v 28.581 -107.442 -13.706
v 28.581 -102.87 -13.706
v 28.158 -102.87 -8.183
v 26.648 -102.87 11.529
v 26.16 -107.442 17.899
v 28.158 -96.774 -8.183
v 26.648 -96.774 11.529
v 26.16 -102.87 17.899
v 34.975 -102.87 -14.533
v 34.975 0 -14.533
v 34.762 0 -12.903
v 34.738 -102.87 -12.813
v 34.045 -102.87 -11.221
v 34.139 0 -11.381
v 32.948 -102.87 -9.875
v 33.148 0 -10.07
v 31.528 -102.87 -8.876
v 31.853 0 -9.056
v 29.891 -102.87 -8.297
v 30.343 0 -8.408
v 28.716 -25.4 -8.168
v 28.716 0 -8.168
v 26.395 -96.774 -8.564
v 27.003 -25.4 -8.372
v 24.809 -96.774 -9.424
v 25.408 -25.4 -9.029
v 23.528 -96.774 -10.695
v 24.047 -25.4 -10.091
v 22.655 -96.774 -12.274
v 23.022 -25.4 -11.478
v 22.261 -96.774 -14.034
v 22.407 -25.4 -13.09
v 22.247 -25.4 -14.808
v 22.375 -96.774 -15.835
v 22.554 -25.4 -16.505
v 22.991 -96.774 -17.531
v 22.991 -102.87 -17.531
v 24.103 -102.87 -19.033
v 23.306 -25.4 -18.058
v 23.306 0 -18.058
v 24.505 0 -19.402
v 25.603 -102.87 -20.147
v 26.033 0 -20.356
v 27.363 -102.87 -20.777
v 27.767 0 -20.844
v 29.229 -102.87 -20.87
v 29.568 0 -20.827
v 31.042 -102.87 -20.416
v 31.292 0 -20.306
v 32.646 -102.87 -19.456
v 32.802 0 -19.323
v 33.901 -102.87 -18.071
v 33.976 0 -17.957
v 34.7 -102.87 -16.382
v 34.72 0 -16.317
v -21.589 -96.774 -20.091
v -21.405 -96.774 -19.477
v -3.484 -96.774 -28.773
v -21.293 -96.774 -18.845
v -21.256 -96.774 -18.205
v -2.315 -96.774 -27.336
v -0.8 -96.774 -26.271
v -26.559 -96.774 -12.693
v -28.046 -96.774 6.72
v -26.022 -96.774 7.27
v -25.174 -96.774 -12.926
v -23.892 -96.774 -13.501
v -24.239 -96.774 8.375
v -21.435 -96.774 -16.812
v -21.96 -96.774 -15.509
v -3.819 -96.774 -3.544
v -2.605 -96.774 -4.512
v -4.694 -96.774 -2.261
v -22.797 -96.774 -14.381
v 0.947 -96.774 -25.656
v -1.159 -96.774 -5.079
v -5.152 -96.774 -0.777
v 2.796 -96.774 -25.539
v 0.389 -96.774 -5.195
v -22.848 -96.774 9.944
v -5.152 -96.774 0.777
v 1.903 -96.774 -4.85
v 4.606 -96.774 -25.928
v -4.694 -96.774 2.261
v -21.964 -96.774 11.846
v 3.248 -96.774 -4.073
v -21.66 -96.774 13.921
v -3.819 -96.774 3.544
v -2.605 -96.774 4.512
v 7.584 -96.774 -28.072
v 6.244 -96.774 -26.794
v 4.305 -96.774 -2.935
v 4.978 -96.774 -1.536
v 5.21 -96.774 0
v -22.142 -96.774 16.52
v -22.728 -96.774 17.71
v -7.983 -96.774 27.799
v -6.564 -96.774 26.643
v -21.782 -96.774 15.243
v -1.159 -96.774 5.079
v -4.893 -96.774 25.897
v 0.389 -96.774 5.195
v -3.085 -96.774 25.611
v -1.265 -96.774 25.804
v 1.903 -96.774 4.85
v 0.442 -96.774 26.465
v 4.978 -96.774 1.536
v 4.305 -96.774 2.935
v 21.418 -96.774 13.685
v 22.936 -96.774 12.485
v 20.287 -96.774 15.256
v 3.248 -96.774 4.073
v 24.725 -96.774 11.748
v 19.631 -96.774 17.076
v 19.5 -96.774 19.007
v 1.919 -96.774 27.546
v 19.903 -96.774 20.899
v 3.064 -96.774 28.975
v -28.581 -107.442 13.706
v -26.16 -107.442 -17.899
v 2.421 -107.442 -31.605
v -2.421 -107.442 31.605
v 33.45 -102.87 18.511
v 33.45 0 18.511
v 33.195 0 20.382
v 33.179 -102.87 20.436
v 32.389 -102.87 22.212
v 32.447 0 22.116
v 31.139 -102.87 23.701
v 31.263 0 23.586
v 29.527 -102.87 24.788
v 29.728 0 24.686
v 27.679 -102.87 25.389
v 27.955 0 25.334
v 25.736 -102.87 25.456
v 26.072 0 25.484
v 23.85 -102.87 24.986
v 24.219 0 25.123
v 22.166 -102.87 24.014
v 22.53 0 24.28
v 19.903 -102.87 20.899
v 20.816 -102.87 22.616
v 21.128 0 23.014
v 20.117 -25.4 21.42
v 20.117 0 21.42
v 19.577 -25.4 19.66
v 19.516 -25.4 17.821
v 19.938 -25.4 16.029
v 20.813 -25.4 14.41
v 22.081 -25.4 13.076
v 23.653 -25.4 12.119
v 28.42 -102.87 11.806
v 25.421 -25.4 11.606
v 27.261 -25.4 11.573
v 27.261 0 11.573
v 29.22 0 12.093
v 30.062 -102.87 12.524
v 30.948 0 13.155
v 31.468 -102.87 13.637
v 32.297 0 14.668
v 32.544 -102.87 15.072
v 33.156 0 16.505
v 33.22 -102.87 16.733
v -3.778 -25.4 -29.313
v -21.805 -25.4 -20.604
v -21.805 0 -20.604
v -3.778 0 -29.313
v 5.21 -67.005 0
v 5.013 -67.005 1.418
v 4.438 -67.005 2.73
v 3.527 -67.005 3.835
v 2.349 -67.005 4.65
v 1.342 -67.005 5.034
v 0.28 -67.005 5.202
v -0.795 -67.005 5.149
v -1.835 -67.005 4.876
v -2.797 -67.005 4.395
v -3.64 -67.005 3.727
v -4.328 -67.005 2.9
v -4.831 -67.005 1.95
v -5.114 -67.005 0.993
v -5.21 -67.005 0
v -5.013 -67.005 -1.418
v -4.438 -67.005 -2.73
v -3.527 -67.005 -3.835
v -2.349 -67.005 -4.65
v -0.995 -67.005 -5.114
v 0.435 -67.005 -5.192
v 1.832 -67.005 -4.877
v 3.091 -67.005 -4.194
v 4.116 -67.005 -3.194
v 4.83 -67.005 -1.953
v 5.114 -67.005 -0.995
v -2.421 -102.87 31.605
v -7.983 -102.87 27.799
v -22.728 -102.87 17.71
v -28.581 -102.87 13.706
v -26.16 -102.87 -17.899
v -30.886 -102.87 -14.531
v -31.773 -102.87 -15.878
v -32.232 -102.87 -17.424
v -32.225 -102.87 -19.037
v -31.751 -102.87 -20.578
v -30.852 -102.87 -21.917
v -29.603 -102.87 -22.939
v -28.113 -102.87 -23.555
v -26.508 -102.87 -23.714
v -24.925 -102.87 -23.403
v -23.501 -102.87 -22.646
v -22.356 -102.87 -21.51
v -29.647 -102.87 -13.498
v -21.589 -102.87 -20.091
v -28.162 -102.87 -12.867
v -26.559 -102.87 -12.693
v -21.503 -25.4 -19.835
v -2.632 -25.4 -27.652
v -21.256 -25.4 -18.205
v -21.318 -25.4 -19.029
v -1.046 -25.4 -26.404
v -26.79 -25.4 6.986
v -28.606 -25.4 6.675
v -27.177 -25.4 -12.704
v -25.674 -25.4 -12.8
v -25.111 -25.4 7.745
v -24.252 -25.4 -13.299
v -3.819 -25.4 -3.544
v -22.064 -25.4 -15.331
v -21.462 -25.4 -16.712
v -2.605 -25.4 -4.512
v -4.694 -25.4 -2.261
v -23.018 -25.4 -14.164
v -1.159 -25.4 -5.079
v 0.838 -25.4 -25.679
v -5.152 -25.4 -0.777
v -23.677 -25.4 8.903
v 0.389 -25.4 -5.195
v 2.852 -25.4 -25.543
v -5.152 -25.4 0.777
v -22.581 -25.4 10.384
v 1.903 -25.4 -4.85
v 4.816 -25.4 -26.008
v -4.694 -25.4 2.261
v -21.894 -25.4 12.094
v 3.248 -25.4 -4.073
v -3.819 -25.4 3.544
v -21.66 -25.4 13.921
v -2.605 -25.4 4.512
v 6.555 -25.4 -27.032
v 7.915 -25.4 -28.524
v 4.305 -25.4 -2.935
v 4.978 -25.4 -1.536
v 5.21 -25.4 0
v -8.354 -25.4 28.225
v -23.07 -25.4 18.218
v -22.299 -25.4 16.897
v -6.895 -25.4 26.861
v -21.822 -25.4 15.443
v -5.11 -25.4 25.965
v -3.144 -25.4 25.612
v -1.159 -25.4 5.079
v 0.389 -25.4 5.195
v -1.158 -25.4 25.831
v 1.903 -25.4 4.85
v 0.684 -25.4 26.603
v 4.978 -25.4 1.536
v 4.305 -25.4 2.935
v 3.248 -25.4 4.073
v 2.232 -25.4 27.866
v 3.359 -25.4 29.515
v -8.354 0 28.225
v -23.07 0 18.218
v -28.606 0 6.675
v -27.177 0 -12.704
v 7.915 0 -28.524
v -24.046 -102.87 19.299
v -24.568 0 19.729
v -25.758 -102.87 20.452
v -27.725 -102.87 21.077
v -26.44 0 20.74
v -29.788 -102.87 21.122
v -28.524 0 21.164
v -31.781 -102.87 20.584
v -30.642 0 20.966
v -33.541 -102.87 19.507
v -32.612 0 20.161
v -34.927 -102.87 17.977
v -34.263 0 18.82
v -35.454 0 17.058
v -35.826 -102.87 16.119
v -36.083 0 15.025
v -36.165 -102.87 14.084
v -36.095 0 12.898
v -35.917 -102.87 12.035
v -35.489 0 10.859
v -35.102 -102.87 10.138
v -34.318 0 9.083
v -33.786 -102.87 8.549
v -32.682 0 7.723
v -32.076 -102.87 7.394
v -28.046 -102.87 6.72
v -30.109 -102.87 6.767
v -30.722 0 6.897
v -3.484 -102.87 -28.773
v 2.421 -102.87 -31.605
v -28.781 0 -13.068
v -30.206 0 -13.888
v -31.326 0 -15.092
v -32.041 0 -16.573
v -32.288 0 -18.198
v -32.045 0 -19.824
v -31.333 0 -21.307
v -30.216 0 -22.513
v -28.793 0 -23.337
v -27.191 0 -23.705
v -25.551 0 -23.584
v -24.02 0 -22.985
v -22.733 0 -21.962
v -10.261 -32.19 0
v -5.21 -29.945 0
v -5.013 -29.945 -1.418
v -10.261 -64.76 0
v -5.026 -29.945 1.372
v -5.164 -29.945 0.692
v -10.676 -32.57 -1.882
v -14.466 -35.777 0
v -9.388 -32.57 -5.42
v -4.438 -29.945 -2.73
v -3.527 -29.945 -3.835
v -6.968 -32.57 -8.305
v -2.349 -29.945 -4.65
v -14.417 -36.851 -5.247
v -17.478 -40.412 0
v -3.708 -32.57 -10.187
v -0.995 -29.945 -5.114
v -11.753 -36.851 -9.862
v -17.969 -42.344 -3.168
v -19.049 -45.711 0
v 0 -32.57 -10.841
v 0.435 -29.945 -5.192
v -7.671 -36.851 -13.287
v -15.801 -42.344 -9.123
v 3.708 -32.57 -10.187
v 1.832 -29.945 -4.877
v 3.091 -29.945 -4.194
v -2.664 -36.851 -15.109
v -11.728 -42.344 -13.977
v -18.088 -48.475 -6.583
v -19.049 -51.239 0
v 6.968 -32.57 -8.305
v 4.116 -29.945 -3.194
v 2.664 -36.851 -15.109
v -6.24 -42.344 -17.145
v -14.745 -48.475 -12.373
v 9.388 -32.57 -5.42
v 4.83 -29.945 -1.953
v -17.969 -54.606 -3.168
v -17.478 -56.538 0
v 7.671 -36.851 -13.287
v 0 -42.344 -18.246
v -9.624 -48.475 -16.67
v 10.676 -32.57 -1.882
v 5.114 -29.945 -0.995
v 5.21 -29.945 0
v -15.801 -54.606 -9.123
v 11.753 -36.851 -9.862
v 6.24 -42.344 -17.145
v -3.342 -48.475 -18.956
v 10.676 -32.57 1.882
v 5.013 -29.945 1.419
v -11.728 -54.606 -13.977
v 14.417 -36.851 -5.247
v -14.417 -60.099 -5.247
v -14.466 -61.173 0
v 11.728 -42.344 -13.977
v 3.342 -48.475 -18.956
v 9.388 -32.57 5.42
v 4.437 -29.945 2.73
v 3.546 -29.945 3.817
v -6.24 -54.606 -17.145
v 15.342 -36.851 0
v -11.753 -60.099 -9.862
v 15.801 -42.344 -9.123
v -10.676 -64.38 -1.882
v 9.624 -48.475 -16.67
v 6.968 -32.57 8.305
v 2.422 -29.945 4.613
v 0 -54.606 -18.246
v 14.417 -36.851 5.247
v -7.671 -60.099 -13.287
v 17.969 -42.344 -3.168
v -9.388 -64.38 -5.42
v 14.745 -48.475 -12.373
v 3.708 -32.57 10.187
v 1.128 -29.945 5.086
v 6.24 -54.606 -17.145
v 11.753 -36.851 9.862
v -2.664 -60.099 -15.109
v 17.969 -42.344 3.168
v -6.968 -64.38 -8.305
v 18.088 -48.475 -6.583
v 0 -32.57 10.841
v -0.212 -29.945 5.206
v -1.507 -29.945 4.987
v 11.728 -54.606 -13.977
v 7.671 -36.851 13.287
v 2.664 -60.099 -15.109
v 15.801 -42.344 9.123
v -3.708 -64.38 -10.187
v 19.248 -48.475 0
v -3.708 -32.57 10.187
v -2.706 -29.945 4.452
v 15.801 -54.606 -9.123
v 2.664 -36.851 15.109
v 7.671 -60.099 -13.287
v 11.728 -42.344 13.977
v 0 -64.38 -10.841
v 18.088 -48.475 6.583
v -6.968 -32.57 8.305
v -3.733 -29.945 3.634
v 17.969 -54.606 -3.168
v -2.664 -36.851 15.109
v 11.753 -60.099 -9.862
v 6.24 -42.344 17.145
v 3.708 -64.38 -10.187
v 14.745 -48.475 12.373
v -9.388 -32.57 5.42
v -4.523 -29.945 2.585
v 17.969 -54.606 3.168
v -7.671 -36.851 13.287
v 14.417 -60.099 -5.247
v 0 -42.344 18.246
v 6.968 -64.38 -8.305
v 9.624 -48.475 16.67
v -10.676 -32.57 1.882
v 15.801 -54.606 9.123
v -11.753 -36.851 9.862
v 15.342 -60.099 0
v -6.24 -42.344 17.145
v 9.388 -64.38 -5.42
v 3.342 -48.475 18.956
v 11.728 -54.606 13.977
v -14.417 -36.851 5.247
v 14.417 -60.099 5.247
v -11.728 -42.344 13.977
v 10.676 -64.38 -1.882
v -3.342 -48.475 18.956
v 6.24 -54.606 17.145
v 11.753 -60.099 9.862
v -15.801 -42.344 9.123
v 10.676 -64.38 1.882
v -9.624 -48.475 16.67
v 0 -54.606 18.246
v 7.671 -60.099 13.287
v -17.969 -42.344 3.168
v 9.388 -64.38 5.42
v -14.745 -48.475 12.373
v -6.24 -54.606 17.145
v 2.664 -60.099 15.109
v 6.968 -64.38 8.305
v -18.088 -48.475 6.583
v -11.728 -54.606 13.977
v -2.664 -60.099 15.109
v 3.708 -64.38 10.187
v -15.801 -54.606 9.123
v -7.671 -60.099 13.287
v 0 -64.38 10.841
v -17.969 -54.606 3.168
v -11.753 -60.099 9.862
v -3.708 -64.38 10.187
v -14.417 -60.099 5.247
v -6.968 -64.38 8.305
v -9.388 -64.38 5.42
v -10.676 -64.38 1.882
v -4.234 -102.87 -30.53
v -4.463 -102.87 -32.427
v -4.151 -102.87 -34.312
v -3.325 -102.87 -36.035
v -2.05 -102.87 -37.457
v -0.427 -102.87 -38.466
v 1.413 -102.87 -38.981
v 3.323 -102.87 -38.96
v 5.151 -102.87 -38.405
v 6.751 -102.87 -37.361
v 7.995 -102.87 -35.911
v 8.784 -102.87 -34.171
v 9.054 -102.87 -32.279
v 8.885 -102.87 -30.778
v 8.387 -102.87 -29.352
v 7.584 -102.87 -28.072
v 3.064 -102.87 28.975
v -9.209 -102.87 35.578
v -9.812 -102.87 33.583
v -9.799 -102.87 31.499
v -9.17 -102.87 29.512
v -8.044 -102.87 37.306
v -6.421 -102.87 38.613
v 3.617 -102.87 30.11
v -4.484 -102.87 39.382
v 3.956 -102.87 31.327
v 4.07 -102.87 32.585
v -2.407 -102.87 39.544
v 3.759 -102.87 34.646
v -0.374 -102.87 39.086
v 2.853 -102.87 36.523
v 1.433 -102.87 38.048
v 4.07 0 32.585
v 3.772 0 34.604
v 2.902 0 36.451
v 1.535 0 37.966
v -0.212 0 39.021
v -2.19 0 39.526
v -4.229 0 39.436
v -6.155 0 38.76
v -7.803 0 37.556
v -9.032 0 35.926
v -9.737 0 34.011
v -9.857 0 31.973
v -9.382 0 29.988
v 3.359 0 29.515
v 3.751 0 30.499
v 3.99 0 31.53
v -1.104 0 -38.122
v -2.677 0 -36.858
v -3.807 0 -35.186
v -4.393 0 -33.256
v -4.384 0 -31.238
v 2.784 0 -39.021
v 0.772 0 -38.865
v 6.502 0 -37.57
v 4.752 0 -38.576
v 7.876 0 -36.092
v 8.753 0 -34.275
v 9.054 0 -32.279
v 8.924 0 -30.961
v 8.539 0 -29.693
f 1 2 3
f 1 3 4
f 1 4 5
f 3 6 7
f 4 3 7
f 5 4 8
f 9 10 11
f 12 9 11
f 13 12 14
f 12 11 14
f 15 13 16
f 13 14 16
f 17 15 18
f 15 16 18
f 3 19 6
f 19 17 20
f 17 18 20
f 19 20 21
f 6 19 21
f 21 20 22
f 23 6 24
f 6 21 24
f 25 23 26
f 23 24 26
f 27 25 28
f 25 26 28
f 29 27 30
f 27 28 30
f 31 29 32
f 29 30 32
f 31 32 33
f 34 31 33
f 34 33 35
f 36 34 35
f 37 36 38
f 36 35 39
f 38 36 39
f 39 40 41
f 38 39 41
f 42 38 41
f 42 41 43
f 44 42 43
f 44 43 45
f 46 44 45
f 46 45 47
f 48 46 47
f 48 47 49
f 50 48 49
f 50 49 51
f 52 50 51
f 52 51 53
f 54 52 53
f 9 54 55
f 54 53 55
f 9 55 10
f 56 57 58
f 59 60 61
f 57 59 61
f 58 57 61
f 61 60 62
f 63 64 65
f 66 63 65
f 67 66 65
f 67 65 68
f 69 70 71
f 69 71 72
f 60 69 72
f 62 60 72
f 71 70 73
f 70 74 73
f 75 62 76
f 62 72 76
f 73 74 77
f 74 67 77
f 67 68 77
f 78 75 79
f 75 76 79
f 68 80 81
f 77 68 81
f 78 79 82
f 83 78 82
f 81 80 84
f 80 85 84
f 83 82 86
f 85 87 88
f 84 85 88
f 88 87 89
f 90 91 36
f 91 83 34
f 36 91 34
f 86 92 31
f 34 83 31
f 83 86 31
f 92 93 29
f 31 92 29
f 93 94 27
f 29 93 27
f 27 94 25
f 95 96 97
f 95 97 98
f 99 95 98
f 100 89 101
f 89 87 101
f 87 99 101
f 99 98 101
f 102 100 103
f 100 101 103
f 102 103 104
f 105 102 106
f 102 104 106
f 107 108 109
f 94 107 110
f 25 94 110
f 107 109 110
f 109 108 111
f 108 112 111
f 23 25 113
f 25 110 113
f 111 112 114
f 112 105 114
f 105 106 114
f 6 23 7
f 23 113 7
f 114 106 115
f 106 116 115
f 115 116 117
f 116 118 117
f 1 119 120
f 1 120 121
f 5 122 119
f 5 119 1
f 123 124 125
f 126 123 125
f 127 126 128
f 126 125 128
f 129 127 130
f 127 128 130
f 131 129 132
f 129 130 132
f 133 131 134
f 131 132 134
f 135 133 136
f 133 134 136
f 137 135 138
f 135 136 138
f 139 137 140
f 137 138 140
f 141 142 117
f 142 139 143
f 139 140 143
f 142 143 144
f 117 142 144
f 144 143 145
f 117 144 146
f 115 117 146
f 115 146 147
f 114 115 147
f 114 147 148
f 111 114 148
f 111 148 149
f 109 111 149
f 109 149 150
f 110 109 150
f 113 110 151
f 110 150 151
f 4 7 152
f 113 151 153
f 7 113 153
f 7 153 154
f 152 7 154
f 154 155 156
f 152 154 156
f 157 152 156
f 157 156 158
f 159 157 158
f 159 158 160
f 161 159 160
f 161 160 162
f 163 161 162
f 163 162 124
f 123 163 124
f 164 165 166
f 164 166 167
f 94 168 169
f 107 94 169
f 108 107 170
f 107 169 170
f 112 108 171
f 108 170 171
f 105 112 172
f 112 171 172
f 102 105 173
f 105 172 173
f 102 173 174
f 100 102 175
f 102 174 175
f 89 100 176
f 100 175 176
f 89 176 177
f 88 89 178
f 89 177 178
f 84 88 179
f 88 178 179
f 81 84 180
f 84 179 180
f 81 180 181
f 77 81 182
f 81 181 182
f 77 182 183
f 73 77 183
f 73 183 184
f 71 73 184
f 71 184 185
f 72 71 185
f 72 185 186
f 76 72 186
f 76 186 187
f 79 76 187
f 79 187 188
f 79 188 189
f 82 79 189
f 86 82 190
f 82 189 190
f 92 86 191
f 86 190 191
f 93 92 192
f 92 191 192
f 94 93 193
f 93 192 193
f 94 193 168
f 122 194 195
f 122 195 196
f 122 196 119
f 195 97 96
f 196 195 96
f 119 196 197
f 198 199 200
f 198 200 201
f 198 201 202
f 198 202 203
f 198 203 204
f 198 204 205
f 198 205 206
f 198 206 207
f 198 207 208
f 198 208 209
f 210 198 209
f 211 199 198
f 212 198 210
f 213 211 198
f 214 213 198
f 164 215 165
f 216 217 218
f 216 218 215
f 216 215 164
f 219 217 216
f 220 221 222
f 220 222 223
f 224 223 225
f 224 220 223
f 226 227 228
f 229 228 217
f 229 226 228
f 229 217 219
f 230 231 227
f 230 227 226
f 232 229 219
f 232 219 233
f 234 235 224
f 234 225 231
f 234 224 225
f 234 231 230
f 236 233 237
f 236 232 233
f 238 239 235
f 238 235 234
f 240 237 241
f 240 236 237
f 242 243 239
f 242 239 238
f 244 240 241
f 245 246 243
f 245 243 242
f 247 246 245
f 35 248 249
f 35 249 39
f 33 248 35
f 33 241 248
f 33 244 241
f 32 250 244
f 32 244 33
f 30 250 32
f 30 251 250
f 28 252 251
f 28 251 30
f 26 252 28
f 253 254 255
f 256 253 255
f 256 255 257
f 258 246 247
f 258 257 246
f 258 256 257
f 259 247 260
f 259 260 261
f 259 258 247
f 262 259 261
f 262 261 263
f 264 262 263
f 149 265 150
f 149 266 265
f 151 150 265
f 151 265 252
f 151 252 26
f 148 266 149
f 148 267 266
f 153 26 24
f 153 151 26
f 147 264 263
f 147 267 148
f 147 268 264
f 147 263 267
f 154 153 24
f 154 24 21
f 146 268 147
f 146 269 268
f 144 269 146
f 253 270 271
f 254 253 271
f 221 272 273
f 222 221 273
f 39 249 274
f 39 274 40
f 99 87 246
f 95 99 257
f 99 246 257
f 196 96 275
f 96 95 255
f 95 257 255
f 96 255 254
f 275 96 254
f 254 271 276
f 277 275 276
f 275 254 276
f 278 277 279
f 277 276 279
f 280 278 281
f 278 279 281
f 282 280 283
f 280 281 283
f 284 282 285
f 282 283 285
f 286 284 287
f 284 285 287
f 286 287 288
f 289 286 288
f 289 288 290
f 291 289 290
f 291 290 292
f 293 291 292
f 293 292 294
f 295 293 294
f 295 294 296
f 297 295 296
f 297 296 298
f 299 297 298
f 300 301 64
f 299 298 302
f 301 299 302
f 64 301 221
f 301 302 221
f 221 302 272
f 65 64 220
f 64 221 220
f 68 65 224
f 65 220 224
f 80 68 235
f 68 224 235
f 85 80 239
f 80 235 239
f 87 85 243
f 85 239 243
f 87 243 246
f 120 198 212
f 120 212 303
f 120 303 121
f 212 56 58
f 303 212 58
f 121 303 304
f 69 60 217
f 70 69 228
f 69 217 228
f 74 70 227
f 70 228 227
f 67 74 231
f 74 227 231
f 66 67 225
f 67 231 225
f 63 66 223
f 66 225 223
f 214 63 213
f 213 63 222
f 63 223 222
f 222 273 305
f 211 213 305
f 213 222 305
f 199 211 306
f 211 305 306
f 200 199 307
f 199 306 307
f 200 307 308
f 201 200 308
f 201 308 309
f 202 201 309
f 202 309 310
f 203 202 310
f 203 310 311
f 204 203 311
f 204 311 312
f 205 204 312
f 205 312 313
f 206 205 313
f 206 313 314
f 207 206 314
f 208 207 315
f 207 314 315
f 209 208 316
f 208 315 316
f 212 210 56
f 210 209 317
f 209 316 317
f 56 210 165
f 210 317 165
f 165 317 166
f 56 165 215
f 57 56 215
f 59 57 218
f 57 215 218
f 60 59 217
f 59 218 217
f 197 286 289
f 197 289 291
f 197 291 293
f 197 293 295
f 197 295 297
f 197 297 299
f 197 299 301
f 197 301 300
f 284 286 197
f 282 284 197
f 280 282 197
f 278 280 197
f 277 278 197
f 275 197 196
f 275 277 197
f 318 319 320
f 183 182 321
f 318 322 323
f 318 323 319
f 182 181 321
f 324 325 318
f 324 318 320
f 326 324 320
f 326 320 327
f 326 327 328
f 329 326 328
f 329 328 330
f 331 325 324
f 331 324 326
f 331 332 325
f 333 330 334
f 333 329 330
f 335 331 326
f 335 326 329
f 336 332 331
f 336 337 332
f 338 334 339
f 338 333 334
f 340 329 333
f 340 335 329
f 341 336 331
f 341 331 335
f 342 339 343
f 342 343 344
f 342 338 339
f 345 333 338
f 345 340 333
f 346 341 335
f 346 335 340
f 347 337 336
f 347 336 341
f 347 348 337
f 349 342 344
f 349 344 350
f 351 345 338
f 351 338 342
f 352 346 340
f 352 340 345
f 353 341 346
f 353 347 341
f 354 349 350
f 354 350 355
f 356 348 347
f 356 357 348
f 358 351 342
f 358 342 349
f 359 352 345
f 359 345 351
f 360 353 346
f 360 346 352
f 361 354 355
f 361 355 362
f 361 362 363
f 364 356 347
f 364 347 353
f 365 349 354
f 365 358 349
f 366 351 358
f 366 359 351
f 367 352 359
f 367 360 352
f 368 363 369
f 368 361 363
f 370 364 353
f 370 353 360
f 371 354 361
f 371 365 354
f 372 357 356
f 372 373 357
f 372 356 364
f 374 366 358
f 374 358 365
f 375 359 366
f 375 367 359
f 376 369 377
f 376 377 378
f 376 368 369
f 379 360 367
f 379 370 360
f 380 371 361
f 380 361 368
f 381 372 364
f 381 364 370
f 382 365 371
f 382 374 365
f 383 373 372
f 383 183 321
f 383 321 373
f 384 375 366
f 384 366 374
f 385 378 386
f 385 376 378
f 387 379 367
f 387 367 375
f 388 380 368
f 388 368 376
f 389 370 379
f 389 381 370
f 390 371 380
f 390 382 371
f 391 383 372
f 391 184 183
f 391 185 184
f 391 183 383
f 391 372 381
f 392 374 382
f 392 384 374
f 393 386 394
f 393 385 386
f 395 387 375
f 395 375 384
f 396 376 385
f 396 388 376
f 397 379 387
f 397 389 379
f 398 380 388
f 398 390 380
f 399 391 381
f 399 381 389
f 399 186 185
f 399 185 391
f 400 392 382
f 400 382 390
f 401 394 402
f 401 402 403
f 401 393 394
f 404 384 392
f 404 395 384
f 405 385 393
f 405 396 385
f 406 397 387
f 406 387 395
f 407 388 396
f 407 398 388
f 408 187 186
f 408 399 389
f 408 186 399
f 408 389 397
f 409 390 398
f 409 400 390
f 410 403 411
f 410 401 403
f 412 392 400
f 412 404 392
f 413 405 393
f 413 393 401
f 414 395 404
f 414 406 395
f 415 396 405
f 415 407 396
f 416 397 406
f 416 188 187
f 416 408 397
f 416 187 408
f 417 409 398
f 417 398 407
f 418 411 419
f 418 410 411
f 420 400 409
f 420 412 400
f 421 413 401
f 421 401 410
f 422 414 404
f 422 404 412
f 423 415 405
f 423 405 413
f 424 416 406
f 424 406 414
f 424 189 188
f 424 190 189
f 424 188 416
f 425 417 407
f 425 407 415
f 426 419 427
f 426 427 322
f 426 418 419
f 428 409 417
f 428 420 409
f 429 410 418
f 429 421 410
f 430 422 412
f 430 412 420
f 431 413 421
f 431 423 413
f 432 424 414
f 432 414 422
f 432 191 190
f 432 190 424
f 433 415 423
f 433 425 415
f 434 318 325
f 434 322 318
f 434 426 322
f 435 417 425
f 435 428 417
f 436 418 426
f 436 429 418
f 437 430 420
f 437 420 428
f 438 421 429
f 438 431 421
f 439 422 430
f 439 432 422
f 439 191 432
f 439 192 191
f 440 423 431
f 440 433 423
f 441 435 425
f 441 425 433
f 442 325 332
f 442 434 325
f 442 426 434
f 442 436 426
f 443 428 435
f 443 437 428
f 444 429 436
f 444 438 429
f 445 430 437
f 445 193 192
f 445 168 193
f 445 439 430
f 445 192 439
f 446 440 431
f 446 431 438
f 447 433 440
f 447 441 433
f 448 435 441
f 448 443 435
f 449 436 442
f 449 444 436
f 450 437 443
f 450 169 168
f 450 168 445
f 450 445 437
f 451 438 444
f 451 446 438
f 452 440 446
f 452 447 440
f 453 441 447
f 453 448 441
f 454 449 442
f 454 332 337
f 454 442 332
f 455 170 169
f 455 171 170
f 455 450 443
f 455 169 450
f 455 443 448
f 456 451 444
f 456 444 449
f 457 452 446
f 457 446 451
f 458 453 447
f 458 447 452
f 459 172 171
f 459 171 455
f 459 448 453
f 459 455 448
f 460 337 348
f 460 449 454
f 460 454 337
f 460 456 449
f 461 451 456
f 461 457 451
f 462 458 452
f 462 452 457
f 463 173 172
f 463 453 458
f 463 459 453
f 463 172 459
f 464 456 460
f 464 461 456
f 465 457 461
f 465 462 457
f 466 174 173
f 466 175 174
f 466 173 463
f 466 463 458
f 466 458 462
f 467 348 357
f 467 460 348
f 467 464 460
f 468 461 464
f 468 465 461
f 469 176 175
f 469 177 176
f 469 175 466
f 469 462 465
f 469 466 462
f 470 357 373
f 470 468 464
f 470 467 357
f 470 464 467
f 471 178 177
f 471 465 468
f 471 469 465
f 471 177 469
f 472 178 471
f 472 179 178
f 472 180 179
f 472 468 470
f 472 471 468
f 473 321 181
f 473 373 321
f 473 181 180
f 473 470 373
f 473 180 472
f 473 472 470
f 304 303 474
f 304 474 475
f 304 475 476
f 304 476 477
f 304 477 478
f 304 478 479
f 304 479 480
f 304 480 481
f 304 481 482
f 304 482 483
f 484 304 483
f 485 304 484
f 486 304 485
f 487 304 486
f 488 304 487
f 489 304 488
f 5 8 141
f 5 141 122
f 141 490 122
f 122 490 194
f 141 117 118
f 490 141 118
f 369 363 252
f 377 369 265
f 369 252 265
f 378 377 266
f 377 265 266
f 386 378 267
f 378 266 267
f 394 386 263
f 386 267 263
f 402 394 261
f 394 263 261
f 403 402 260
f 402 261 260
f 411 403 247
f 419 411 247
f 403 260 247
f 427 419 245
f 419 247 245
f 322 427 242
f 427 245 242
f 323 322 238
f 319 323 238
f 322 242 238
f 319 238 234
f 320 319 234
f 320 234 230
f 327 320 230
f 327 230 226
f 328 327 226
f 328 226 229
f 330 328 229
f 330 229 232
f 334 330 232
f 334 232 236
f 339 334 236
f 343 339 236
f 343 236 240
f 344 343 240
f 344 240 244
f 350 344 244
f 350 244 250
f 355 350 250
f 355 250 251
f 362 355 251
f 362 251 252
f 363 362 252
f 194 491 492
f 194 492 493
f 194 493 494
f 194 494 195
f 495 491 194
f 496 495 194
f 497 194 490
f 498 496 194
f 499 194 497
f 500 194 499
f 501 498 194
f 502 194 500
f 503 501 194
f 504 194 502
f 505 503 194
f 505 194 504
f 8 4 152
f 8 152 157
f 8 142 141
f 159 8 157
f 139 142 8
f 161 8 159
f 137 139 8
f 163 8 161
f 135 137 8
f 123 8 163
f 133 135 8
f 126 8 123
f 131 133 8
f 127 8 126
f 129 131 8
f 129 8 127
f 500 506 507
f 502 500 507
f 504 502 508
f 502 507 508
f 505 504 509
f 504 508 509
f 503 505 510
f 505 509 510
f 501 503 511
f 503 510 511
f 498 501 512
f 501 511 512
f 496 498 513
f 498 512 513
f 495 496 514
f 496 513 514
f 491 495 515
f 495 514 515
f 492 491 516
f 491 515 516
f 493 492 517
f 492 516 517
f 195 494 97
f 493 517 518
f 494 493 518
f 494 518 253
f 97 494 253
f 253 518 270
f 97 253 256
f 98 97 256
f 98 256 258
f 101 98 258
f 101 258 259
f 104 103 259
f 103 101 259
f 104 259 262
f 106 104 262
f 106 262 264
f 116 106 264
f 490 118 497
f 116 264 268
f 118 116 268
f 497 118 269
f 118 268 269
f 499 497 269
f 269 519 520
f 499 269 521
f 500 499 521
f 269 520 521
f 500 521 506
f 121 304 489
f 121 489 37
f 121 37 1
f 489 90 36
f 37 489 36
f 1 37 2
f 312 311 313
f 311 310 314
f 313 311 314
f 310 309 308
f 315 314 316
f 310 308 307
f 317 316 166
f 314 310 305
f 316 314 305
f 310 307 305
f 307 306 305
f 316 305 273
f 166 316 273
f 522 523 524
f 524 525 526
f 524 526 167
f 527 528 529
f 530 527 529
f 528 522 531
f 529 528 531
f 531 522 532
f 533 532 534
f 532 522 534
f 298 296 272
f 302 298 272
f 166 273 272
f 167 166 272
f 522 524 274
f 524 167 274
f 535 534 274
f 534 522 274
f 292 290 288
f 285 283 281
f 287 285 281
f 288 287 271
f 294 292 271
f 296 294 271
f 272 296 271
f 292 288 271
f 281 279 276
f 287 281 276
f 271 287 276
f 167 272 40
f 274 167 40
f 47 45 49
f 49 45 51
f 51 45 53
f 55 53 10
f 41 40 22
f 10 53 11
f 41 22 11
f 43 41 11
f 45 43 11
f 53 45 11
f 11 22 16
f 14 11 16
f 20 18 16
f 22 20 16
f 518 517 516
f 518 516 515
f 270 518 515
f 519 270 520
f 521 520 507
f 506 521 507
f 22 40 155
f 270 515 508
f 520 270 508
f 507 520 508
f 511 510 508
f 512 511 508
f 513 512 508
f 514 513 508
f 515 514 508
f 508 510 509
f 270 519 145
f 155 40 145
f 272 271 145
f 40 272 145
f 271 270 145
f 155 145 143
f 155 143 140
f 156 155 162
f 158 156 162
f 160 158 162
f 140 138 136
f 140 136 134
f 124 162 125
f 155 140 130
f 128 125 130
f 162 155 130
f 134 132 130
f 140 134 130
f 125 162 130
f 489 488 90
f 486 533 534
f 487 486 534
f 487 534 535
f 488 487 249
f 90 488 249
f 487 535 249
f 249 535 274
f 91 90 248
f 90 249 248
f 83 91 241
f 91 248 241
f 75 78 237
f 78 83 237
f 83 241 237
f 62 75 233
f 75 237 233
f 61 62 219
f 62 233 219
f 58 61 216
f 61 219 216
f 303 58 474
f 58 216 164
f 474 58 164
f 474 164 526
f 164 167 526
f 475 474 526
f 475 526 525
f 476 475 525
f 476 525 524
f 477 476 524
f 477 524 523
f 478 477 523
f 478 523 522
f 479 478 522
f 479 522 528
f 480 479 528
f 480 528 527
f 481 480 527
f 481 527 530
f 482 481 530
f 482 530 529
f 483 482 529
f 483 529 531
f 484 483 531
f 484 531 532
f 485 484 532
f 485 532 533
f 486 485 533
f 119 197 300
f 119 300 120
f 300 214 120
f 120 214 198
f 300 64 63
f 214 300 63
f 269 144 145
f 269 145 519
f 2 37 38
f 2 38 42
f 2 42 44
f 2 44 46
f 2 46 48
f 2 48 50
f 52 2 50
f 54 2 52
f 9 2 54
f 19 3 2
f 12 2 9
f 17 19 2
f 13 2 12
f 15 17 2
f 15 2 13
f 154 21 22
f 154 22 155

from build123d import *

# Parameters (mm, degrees)
F1_DEPTH = 25.4
F2_R     = 7.2533857786
F2_R_2   = 5.5158705089
F2_R_3   = 6.7589997369
F2_R_4   = 6.3667286832
F2_R_5   = 6.9837940253
F2_R_6   = 6.9770855285
F3_DEPTH = 102.87
F4_R     = 5.2099395751
F5_DEPTH = 102.108
F9_START = 96.774
F9_DEPTH = 10.668


with BuildPart() as f1:
    # F0 (on Front) → F1 (new body)
    with BuildSketch(Plane.XZ):
        Polygon((-29.1519459024, 14.0827481248), (-26.7719905823, -18.2049516588), (2.3799553201, -32.2876997836), (29.1519459024, -14.0827481248), (26.7719905823, 18.2049516588), (-2.3799553201, 32.2876997836), align=None)
    extrude(amount=F1_DEPTH)

    # F2 (on Front) → F3 (join)
    with BuildSketch(Plane.XZ):
        with Locations((-28.9137475193, 13.9214349911)):
            Circle(F2_R)
        with Locations((-26.7719905823, -18.2049516588)):
            Circle(F2_R_2)
        with Locations((2.2947418038, -32.2793722153)):
            Circle(F2_R_3)
        with Locations((28.6077819765, -14.5333660766)):
            Circle(F2_R_4)
        with Locations((26.4660213143, 18.5109190643)):
            Circle(F2_R_5)
        with Locations((-2.9066735879, 32.5853340328)):
            Circle(F2_R_6)
    extrude(amount=F3_DEPTH)

    # F4 (on Front) → F5 (join)
    with BuildSketch(Plane.XZ):
        Circle(F4_R)
    extrude(amount=F5_DEPTH)

    # F6 (on Top) → F7 (revolve)
    with BuildSketch(Plane.XY):
        with BuildLine():
            Line((0, -67.7234342558), (0, -29.2267018693))
            ThreePointArc((0, -29.2267018693), (-19.2483661933, -48.4750680625), (0, -67.7234342558))
        make_face()
    revolve(axis=Axis((0, -48.4750680625, 0), (0, -1, 0)))

    # F8 (on Front) → F9 (join)
    with BuildSketch(Plane.XZ.offset(F9_START)):
        Polygon((-28.5810061773, 13.7057788732), (-26.1600557715, -17.8989879787), (2.4209504058, -31.6047668519), (28.5810061773, -13.7057788732), (26.1600557715, 17.8989879787), (-2.4209504058, 31.6047668519), align=None)
    extrude(amount=F9_DEPTH)


solid = f1.part
